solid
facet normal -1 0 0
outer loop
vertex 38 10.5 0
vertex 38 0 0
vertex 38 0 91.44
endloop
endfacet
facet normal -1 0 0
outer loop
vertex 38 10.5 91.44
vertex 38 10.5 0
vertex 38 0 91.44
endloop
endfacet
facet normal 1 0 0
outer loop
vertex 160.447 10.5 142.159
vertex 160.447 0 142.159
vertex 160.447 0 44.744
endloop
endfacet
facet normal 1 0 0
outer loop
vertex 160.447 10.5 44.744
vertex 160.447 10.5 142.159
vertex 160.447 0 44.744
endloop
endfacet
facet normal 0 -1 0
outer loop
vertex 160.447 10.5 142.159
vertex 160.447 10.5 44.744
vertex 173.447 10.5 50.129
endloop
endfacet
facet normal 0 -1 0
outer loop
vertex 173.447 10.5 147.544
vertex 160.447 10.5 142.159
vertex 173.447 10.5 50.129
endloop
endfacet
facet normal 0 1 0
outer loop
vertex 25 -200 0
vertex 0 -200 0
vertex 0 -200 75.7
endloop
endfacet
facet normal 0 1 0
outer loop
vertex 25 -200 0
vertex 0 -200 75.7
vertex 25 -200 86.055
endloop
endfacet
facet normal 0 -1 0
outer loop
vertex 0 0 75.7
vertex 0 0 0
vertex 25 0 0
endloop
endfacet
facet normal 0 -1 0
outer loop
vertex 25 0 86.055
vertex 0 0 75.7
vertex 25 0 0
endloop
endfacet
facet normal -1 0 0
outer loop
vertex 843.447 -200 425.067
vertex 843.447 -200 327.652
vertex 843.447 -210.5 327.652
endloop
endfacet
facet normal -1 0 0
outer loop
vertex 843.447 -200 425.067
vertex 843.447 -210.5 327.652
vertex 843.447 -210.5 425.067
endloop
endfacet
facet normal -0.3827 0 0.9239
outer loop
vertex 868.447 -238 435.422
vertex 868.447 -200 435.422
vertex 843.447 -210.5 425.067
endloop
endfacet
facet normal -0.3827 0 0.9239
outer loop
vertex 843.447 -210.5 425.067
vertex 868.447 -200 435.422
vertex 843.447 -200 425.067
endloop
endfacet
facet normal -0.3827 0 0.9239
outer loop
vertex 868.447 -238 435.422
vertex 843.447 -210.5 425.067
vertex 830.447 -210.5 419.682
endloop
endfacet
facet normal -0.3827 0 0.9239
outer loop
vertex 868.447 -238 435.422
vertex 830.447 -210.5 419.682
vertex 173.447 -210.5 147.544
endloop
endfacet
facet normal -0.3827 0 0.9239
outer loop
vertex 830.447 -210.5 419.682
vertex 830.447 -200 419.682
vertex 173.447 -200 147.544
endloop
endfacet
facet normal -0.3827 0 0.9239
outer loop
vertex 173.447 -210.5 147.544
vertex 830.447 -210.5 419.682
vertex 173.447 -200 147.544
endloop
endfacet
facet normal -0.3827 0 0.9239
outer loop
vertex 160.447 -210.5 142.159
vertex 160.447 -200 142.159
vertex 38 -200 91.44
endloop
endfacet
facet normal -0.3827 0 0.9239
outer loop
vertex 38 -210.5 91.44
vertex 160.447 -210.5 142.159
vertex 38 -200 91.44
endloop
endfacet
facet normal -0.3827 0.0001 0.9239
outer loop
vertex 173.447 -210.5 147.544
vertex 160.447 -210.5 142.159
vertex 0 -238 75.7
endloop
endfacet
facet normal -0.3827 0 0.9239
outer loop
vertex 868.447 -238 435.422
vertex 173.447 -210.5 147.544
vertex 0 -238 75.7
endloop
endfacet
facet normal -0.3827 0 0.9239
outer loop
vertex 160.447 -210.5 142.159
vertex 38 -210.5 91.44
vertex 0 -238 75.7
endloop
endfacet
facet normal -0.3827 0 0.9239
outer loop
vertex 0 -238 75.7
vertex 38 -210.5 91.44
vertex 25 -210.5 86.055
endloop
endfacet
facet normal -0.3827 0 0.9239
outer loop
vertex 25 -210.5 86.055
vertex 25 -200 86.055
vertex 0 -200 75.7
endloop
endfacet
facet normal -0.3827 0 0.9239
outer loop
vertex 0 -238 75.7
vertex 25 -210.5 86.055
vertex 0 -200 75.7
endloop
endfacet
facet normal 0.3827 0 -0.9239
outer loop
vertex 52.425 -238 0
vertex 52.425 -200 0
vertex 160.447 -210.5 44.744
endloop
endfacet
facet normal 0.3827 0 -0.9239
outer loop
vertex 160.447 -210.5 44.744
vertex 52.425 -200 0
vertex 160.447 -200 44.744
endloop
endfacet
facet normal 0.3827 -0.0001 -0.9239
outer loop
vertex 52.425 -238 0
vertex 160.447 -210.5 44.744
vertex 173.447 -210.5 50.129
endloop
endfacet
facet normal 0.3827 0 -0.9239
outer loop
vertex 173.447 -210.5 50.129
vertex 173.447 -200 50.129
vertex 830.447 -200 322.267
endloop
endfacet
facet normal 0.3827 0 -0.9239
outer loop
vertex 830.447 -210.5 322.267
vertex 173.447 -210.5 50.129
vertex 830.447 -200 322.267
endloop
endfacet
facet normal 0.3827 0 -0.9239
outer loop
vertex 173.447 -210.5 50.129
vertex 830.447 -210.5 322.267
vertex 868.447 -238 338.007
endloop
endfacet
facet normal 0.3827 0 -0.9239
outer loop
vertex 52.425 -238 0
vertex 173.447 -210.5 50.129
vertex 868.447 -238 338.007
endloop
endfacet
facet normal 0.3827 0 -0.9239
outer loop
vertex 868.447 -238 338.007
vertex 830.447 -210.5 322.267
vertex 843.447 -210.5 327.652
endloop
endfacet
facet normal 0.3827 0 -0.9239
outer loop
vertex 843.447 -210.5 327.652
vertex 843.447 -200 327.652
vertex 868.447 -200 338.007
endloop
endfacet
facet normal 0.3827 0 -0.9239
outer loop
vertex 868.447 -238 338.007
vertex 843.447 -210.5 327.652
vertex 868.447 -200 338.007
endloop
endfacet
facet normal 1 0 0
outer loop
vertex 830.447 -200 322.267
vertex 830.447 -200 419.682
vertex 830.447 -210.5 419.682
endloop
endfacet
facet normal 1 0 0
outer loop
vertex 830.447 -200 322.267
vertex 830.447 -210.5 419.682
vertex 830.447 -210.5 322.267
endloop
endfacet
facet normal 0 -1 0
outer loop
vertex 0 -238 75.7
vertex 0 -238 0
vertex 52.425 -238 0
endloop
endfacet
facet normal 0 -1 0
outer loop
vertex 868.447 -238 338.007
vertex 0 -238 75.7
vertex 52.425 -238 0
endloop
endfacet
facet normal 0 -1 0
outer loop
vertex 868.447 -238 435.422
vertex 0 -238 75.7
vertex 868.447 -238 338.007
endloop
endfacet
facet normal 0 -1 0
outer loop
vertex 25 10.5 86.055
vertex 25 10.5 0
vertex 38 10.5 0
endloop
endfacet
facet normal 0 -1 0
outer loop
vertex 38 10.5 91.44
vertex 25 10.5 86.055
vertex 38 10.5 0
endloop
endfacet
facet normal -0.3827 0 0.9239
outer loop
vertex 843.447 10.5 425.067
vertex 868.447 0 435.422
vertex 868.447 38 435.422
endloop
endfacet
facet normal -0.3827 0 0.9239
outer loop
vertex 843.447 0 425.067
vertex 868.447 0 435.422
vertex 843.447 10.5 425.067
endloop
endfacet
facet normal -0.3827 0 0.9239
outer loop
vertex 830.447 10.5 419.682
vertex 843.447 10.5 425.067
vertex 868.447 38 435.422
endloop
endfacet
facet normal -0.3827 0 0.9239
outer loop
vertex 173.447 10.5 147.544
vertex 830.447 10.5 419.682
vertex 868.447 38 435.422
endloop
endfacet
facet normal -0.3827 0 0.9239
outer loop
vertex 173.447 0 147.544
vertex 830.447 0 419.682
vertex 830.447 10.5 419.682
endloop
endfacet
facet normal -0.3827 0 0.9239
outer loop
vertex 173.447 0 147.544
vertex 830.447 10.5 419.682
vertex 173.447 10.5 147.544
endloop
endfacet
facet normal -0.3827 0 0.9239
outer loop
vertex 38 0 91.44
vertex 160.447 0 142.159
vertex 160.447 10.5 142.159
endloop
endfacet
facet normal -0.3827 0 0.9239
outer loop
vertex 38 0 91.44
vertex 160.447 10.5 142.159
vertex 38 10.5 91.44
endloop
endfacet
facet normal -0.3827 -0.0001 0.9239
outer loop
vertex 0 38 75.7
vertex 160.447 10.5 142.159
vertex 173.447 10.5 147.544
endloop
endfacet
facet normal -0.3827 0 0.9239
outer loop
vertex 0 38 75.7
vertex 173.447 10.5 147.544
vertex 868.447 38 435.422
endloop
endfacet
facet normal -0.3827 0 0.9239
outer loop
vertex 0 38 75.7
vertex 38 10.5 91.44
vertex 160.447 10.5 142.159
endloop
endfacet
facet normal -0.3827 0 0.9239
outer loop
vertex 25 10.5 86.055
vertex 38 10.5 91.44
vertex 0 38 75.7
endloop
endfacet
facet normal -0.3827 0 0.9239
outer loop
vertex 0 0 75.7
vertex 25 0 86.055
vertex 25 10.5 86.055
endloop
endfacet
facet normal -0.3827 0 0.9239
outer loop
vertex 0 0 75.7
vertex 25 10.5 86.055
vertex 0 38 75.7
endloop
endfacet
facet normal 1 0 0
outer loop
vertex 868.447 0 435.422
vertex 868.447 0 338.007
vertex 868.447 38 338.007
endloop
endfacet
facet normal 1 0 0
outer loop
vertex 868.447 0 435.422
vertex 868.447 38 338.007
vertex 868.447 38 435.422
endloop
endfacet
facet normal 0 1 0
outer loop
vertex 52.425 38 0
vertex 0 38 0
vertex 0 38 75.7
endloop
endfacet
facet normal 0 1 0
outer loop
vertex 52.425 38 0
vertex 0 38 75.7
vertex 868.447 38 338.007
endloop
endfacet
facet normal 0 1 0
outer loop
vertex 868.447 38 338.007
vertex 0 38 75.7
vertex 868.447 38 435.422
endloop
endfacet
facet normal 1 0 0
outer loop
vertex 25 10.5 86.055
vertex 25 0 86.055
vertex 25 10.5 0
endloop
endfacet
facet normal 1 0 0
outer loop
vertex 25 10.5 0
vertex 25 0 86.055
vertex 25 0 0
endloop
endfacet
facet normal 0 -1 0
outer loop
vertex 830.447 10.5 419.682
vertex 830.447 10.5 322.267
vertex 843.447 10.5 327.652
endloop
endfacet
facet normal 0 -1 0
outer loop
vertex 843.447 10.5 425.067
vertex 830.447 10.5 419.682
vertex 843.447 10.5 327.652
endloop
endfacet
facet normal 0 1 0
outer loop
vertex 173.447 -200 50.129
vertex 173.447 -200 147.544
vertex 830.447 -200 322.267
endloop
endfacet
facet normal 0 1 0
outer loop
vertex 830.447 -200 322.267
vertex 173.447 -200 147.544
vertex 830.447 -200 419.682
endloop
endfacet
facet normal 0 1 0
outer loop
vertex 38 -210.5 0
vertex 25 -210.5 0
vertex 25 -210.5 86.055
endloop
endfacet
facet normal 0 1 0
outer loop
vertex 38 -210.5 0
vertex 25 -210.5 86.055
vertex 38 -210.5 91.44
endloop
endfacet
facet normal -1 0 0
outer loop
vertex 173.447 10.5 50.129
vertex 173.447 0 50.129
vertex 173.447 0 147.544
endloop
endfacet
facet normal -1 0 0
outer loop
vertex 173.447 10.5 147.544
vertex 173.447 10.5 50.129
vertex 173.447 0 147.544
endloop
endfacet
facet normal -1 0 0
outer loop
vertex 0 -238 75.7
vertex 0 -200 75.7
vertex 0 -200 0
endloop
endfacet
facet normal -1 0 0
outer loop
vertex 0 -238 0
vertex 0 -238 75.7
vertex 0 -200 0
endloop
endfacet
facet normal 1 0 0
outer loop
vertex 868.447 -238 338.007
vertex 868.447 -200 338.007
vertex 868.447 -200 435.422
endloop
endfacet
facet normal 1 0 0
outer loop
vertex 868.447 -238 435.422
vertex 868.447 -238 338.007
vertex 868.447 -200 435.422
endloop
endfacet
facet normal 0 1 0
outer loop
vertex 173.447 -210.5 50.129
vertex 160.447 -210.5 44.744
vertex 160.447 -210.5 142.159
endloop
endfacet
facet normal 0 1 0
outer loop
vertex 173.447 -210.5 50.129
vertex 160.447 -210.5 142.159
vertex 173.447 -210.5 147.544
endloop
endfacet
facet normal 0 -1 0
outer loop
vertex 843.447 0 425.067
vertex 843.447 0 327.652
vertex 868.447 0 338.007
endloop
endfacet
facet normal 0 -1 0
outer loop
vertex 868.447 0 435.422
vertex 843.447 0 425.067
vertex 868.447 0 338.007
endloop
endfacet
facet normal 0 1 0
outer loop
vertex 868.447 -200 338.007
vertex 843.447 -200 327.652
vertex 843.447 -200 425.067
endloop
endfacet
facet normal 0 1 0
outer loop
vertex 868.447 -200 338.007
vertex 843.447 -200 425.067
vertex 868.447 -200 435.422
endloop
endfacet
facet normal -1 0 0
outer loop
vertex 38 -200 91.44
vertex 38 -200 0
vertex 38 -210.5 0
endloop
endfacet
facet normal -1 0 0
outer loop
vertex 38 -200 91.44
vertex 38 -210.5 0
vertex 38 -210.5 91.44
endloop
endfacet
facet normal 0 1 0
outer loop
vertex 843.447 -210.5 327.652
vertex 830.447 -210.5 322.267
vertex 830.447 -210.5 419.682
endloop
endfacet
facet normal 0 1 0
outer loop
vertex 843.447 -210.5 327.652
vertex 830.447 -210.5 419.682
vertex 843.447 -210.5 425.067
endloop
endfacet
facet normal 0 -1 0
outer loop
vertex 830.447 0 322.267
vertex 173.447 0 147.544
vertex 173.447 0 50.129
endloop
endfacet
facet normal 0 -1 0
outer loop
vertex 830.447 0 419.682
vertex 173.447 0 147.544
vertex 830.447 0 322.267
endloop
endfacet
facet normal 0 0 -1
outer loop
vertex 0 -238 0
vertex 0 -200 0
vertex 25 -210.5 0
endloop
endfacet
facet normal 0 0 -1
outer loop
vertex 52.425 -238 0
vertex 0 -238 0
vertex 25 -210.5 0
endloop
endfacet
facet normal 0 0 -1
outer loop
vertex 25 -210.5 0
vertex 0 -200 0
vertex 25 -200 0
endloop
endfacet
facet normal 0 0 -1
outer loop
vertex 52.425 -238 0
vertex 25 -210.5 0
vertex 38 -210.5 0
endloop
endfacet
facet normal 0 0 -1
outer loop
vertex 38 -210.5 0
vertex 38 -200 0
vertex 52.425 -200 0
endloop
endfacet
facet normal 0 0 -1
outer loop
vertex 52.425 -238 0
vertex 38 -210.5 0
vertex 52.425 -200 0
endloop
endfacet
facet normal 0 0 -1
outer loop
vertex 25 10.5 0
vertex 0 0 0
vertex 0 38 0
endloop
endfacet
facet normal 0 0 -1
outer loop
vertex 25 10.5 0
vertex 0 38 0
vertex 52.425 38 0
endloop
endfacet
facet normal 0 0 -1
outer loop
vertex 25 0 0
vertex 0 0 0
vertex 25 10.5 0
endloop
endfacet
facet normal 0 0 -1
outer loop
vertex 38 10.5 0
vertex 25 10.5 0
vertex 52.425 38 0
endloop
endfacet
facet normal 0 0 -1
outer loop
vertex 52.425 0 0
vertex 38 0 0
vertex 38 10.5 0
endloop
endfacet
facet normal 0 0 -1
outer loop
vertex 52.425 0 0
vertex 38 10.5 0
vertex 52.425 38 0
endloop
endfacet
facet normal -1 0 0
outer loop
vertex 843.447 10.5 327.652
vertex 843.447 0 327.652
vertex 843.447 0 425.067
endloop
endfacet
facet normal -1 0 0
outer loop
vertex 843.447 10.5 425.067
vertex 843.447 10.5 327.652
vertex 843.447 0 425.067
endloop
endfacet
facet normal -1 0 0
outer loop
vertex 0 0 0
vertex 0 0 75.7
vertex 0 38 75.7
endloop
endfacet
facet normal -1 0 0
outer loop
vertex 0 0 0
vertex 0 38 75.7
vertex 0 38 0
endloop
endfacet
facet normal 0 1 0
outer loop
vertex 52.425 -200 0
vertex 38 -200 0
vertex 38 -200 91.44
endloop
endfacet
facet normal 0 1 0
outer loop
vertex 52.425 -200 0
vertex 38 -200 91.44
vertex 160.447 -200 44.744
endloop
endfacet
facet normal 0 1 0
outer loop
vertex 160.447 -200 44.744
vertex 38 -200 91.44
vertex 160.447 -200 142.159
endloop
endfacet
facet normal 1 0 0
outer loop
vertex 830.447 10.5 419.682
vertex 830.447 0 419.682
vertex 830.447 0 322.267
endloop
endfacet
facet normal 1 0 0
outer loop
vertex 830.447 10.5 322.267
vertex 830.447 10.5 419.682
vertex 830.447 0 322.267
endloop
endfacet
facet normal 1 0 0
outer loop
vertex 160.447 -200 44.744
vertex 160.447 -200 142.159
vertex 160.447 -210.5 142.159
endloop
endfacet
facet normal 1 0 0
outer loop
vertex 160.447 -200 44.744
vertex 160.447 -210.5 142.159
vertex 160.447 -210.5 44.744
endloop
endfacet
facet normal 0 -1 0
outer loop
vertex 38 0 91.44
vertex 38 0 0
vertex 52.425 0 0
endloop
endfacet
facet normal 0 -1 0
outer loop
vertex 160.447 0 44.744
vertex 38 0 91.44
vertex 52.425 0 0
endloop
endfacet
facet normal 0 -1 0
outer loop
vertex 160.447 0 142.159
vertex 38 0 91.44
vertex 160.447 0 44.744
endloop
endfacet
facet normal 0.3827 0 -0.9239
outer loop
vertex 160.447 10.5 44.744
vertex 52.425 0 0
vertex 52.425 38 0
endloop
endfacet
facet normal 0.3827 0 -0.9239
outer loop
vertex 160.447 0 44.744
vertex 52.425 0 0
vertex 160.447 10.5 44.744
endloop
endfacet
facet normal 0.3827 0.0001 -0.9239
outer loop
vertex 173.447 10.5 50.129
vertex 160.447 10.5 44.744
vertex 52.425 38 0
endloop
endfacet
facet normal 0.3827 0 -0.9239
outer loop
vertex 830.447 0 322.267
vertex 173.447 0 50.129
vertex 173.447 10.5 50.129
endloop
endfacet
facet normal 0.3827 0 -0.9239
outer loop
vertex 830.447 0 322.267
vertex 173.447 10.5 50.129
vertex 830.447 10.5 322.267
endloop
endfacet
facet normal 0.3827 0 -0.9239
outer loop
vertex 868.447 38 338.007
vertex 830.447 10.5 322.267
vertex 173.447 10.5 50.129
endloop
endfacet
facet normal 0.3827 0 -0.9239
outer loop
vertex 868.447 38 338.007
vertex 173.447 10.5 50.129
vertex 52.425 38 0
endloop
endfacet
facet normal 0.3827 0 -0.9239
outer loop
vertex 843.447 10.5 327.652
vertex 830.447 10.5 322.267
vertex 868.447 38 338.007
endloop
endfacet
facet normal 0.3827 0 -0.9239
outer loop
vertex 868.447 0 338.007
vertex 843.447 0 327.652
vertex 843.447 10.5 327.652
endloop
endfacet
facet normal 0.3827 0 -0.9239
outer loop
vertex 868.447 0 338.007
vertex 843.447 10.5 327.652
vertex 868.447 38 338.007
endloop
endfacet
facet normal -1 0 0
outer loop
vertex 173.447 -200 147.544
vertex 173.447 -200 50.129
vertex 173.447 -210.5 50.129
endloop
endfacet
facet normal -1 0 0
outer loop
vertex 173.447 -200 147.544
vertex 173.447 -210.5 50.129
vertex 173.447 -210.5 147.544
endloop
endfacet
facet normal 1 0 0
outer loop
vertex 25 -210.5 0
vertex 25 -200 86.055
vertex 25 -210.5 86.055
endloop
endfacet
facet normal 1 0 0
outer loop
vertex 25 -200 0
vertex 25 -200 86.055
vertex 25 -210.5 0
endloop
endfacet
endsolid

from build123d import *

# Parameters (mm, degrees)
F1_DEPTH = 38
F3_DEPTH = 10.5


with BuildPart() as f1:
    # F0 (on Front) → F1 (new body)
    with BuildSketch(Plane.XZ):
        Polygon((0, 75.7), (0, 0), (52.4253670061, 0), (868.4467605606, 338.0071283969), (868.4467605606, 435.4224264232), align=None)
    extrude(amount=-F1_DEPTH)

    # F2 (on face) → F3 (cut)
    with BuildSketch(Plane.XZ):
        Polygon((843.4467605606, 425.0670873639), (830.4467605606, 419.682311053), (830.4467605606, 322.2670130267), (843.4467605606, 327.6517893375), align=None)
        Polygon((173.4467605606, 50.1287025476), (173.4467605606, 147.5440005739), (160.4467605606, 142.159224263), (160.4467605606, 44.7439262367), align=None)
        Polygon((25, 0), (38, 0), (38, 91.4401153702), (25, 86.0553390593), align=None)
    extrude(amount=-F3_DEPTH, mode=Mode.SUBTRACT)


with BuildPart() as f5_1:
    # F5: instance of F1
    add(f1.part.mirror(Plane(origin=(501.9467605606, -100, 234.9055068003), x_dir=(1, 0, 0), z_dir=(0, -1, 0))))


solid = Compound([f1.part, f5_1.part])
